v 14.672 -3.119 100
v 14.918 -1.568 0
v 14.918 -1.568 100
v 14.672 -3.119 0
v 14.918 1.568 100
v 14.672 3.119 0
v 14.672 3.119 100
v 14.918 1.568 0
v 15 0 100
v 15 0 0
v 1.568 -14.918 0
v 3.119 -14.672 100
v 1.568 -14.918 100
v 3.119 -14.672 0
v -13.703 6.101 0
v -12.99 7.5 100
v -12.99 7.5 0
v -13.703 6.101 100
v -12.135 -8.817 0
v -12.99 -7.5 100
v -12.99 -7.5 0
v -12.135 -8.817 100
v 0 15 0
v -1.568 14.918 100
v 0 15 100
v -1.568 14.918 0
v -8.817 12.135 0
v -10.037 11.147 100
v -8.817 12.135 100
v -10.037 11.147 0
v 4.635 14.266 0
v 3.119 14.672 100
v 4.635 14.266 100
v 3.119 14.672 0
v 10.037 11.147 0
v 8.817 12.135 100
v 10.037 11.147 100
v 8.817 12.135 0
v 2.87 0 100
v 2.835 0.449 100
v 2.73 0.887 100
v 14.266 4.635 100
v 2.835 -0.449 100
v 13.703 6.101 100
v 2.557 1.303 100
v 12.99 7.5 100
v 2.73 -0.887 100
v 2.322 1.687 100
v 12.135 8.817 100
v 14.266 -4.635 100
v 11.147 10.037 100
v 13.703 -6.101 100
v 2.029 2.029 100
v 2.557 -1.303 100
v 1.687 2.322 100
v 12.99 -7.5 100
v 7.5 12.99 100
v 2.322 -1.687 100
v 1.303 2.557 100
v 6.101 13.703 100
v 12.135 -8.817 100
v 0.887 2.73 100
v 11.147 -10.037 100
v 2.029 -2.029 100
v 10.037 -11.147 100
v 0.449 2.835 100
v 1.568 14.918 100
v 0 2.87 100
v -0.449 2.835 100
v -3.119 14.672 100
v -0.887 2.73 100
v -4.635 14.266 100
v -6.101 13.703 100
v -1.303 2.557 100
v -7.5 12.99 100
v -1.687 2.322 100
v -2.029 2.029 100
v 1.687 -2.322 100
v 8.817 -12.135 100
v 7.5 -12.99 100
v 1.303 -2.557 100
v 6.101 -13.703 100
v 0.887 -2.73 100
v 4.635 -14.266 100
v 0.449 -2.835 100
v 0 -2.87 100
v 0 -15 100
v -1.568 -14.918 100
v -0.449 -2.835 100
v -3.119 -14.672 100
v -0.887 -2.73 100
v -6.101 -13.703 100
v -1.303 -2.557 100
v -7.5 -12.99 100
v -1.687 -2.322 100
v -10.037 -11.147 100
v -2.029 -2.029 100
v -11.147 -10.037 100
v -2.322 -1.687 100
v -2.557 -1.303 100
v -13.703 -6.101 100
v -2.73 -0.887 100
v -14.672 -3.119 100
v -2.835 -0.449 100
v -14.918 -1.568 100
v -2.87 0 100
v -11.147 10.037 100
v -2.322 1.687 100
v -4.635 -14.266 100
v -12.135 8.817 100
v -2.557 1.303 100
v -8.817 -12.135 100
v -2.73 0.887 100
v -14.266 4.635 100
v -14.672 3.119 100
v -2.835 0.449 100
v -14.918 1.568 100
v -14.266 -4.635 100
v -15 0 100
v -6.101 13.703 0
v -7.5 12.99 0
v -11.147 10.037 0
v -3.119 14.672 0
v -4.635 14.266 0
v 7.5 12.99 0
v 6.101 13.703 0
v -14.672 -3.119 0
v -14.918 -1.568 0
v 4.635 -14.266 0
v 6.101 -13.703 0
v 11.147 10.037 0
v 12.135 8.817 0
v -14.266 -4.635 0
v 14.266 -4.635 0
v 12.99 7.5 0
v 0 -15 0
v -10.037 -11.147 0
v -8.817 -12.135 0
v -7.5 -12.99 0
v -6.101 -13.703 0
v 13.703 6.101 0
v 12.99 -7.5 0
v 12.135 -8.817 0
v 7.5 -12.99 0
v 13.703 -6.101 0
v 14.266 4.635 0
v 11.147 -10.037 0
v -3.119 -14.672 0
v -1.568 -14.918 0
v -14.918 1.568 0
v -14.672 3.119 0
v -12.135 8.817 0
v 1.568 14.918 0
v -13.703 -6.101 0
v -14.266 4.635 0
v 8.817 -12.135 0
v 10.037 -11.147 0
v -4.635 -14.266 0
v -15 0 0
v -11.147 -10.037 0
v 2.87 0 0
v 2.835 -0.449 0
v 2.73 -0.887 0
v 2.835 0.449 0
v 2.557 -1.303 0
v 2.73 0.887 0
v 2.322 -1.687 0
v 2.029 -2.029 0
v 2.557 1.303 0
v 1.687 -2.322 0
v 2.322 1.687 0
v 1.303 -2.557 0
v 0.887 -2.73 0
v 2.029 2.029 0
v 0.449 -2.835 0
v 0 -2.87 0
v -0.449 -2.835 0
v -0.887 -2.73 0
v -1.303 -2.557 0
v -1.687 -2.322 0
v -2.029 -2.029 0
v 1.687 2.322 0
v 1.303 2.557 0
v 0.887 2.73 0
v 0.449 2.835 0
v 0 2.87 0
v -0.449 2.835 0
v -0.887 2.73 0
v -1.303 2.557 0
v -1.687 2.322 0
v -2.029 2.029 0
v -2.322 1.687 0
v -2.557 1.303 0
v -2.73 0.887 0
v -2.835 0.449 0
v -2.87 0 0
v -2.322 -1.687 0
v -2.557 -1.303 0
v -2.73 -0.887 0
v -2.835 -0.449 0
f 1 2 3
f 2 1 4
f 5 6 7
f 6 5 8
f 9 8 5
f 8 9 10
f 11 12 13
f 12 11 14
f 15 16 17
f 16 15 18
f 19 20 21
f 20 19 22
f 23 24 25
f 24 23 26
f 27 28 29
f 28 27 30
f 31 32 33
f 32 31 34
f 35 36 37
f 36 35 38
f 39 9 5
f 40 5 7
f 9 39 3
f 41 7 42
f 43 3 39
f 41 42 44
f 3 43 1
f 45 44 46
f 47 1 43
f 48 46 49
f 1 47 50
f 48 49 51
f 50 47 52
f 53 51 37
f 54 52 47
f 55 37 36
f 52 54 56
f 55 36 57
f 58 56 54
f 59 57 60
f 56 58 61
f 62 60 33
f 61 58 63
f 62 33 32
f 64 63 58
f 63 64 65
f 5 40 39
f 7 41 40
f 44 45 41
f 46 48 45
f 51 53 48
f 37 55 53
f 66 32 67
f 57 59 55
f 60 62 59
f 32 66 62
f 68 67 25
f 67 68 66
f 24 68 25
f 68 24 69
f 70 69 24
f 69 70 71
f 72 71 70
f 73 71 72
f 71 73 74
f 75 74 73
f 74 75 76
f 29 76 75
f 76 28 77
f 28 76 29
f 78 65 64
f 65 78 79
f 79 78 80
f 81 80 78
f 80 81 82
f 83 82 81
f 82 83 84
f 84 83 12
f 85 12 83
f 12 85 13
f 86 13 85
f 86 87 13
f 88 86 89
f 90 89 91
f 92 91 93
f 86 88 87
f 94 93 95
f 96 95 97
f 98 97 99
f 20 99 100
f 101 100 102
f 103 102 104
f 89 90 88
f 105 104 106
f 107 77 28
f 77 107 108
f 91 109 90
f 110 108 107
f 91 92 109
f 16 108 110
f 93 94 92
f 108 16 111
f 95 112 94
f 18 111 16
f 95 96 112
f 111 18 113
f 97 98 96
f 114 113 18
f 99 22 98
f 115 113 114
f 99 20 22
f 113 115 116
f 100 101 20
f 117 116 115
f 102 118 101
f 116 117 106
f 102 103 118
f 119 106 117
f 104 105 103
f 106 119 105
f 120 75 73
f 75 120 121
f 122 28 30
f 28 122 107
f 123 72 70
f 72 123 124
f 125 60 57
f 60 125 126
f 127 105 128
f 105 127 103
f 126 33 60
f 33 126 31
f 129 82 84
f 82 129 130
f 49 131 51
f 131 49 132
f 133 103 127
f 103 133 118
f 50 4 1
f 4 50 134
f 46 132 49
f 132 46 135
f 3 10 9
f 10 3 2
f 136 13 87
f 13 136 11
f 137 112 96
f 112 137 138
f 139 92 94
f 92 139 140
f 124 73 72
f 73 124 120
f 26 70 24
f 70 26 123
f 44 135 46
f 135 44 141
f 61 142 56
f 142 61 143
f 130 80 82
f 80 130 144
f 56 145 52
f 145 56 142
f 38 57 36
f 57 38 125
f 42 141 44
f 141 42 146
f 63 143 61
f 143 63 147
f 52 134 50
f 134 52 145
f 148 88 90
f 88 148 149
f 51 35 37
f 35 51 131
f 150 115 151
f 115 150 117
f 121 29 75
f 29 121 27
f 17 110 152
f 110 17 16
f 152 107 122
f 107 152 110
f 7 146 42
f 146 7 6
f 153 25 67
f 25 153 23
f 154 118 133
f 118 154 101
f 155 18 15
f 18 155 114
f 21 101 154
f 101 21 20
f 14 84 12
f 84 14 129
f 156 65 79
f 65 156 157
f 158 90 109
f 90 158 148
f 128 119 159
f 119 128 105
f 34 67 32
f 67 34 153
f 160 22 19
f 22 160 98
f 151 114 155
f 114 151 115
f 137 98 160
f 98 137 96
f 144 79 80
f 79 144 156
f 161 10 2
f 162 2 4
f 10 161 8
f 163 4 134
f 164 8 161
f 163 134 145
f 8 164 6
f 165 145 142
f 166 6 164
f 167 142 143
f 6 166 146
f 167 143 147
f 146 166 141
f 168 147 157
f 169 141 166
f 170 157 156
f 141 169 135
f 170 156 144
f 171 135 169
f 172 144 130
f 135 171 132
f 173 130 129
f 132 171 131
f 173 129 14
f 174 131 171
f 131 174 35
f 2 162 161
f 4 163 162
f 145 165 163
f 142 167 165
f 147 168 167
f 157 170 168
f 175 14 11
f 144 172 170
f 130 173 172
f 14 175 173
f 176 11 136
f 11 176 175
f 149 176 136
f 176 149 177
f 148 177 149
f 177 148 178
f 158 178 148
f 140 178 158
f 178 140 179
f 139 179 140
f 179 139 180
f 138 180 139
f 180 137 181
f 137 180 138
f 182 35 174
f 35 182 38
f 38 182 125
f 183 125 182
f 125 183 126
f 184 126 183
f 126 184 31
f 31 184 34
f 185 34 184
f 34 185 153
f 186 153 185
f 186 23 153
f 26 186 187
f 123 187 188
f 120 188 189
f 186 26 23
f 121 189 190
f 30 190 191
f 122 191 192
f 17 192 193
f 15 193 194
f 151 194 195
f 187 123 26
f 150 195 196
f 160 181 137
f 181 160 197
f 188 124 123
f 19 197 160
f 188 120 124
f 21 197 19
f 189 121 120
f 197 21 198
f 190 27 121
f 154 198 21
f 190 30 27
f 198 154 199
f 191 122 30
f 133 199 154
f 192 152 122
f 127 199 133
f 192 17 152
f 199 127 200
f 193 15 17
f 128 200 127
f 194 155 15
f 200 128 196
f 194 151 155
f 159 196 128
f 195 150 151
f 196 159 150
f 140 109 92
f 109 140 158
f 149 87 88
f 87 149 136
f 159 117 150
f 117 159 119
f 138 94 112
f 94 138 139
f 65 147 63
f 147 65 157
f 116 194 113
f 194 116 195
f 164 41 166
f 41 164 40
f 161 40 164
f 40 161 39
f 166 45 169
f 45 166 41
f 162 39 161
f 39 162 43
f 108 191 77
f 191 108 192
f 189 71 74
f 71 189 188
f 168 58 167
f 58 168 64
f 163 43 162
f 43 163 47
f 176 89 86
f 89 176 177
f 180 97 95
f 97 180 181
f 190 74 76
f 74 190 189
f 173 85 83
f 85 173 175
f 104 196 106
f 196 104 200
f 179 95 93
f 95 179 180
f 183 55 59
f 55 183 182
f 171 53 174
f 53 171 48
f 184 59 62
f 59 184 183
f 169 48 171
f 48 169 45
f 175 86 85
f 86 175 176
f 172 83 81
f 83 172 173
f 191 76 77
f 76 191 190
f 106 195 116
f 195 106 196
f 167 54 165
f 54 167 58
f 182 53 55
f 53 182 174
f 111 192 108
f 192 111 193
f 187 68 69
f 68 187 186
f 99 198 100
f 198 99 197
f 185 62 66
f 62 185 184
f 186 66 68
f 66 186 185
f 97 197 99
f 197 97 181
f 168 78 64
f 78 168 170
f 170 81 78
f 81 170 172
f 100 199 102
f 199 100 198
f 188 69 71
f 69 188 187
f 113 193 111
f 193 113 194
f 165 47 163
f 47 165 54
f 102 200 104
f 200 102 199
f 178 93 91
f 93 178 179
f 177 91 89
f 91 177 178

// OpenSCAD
        // Generation: 2 | Session: test-env-id
        wall_thickness = 2.3;
        bore_clearance = 0.8700000000000001;
        roller_radius = 15.0;
        
        module roller() {
            difference() {
                cylinder(h=100, r=roller_radius, $fn=60);
                translate([0,0,-5])
                    cylinder(h=110, r=bore_clearance + 2, $fn=40);
            }
        }
        roller();
        
